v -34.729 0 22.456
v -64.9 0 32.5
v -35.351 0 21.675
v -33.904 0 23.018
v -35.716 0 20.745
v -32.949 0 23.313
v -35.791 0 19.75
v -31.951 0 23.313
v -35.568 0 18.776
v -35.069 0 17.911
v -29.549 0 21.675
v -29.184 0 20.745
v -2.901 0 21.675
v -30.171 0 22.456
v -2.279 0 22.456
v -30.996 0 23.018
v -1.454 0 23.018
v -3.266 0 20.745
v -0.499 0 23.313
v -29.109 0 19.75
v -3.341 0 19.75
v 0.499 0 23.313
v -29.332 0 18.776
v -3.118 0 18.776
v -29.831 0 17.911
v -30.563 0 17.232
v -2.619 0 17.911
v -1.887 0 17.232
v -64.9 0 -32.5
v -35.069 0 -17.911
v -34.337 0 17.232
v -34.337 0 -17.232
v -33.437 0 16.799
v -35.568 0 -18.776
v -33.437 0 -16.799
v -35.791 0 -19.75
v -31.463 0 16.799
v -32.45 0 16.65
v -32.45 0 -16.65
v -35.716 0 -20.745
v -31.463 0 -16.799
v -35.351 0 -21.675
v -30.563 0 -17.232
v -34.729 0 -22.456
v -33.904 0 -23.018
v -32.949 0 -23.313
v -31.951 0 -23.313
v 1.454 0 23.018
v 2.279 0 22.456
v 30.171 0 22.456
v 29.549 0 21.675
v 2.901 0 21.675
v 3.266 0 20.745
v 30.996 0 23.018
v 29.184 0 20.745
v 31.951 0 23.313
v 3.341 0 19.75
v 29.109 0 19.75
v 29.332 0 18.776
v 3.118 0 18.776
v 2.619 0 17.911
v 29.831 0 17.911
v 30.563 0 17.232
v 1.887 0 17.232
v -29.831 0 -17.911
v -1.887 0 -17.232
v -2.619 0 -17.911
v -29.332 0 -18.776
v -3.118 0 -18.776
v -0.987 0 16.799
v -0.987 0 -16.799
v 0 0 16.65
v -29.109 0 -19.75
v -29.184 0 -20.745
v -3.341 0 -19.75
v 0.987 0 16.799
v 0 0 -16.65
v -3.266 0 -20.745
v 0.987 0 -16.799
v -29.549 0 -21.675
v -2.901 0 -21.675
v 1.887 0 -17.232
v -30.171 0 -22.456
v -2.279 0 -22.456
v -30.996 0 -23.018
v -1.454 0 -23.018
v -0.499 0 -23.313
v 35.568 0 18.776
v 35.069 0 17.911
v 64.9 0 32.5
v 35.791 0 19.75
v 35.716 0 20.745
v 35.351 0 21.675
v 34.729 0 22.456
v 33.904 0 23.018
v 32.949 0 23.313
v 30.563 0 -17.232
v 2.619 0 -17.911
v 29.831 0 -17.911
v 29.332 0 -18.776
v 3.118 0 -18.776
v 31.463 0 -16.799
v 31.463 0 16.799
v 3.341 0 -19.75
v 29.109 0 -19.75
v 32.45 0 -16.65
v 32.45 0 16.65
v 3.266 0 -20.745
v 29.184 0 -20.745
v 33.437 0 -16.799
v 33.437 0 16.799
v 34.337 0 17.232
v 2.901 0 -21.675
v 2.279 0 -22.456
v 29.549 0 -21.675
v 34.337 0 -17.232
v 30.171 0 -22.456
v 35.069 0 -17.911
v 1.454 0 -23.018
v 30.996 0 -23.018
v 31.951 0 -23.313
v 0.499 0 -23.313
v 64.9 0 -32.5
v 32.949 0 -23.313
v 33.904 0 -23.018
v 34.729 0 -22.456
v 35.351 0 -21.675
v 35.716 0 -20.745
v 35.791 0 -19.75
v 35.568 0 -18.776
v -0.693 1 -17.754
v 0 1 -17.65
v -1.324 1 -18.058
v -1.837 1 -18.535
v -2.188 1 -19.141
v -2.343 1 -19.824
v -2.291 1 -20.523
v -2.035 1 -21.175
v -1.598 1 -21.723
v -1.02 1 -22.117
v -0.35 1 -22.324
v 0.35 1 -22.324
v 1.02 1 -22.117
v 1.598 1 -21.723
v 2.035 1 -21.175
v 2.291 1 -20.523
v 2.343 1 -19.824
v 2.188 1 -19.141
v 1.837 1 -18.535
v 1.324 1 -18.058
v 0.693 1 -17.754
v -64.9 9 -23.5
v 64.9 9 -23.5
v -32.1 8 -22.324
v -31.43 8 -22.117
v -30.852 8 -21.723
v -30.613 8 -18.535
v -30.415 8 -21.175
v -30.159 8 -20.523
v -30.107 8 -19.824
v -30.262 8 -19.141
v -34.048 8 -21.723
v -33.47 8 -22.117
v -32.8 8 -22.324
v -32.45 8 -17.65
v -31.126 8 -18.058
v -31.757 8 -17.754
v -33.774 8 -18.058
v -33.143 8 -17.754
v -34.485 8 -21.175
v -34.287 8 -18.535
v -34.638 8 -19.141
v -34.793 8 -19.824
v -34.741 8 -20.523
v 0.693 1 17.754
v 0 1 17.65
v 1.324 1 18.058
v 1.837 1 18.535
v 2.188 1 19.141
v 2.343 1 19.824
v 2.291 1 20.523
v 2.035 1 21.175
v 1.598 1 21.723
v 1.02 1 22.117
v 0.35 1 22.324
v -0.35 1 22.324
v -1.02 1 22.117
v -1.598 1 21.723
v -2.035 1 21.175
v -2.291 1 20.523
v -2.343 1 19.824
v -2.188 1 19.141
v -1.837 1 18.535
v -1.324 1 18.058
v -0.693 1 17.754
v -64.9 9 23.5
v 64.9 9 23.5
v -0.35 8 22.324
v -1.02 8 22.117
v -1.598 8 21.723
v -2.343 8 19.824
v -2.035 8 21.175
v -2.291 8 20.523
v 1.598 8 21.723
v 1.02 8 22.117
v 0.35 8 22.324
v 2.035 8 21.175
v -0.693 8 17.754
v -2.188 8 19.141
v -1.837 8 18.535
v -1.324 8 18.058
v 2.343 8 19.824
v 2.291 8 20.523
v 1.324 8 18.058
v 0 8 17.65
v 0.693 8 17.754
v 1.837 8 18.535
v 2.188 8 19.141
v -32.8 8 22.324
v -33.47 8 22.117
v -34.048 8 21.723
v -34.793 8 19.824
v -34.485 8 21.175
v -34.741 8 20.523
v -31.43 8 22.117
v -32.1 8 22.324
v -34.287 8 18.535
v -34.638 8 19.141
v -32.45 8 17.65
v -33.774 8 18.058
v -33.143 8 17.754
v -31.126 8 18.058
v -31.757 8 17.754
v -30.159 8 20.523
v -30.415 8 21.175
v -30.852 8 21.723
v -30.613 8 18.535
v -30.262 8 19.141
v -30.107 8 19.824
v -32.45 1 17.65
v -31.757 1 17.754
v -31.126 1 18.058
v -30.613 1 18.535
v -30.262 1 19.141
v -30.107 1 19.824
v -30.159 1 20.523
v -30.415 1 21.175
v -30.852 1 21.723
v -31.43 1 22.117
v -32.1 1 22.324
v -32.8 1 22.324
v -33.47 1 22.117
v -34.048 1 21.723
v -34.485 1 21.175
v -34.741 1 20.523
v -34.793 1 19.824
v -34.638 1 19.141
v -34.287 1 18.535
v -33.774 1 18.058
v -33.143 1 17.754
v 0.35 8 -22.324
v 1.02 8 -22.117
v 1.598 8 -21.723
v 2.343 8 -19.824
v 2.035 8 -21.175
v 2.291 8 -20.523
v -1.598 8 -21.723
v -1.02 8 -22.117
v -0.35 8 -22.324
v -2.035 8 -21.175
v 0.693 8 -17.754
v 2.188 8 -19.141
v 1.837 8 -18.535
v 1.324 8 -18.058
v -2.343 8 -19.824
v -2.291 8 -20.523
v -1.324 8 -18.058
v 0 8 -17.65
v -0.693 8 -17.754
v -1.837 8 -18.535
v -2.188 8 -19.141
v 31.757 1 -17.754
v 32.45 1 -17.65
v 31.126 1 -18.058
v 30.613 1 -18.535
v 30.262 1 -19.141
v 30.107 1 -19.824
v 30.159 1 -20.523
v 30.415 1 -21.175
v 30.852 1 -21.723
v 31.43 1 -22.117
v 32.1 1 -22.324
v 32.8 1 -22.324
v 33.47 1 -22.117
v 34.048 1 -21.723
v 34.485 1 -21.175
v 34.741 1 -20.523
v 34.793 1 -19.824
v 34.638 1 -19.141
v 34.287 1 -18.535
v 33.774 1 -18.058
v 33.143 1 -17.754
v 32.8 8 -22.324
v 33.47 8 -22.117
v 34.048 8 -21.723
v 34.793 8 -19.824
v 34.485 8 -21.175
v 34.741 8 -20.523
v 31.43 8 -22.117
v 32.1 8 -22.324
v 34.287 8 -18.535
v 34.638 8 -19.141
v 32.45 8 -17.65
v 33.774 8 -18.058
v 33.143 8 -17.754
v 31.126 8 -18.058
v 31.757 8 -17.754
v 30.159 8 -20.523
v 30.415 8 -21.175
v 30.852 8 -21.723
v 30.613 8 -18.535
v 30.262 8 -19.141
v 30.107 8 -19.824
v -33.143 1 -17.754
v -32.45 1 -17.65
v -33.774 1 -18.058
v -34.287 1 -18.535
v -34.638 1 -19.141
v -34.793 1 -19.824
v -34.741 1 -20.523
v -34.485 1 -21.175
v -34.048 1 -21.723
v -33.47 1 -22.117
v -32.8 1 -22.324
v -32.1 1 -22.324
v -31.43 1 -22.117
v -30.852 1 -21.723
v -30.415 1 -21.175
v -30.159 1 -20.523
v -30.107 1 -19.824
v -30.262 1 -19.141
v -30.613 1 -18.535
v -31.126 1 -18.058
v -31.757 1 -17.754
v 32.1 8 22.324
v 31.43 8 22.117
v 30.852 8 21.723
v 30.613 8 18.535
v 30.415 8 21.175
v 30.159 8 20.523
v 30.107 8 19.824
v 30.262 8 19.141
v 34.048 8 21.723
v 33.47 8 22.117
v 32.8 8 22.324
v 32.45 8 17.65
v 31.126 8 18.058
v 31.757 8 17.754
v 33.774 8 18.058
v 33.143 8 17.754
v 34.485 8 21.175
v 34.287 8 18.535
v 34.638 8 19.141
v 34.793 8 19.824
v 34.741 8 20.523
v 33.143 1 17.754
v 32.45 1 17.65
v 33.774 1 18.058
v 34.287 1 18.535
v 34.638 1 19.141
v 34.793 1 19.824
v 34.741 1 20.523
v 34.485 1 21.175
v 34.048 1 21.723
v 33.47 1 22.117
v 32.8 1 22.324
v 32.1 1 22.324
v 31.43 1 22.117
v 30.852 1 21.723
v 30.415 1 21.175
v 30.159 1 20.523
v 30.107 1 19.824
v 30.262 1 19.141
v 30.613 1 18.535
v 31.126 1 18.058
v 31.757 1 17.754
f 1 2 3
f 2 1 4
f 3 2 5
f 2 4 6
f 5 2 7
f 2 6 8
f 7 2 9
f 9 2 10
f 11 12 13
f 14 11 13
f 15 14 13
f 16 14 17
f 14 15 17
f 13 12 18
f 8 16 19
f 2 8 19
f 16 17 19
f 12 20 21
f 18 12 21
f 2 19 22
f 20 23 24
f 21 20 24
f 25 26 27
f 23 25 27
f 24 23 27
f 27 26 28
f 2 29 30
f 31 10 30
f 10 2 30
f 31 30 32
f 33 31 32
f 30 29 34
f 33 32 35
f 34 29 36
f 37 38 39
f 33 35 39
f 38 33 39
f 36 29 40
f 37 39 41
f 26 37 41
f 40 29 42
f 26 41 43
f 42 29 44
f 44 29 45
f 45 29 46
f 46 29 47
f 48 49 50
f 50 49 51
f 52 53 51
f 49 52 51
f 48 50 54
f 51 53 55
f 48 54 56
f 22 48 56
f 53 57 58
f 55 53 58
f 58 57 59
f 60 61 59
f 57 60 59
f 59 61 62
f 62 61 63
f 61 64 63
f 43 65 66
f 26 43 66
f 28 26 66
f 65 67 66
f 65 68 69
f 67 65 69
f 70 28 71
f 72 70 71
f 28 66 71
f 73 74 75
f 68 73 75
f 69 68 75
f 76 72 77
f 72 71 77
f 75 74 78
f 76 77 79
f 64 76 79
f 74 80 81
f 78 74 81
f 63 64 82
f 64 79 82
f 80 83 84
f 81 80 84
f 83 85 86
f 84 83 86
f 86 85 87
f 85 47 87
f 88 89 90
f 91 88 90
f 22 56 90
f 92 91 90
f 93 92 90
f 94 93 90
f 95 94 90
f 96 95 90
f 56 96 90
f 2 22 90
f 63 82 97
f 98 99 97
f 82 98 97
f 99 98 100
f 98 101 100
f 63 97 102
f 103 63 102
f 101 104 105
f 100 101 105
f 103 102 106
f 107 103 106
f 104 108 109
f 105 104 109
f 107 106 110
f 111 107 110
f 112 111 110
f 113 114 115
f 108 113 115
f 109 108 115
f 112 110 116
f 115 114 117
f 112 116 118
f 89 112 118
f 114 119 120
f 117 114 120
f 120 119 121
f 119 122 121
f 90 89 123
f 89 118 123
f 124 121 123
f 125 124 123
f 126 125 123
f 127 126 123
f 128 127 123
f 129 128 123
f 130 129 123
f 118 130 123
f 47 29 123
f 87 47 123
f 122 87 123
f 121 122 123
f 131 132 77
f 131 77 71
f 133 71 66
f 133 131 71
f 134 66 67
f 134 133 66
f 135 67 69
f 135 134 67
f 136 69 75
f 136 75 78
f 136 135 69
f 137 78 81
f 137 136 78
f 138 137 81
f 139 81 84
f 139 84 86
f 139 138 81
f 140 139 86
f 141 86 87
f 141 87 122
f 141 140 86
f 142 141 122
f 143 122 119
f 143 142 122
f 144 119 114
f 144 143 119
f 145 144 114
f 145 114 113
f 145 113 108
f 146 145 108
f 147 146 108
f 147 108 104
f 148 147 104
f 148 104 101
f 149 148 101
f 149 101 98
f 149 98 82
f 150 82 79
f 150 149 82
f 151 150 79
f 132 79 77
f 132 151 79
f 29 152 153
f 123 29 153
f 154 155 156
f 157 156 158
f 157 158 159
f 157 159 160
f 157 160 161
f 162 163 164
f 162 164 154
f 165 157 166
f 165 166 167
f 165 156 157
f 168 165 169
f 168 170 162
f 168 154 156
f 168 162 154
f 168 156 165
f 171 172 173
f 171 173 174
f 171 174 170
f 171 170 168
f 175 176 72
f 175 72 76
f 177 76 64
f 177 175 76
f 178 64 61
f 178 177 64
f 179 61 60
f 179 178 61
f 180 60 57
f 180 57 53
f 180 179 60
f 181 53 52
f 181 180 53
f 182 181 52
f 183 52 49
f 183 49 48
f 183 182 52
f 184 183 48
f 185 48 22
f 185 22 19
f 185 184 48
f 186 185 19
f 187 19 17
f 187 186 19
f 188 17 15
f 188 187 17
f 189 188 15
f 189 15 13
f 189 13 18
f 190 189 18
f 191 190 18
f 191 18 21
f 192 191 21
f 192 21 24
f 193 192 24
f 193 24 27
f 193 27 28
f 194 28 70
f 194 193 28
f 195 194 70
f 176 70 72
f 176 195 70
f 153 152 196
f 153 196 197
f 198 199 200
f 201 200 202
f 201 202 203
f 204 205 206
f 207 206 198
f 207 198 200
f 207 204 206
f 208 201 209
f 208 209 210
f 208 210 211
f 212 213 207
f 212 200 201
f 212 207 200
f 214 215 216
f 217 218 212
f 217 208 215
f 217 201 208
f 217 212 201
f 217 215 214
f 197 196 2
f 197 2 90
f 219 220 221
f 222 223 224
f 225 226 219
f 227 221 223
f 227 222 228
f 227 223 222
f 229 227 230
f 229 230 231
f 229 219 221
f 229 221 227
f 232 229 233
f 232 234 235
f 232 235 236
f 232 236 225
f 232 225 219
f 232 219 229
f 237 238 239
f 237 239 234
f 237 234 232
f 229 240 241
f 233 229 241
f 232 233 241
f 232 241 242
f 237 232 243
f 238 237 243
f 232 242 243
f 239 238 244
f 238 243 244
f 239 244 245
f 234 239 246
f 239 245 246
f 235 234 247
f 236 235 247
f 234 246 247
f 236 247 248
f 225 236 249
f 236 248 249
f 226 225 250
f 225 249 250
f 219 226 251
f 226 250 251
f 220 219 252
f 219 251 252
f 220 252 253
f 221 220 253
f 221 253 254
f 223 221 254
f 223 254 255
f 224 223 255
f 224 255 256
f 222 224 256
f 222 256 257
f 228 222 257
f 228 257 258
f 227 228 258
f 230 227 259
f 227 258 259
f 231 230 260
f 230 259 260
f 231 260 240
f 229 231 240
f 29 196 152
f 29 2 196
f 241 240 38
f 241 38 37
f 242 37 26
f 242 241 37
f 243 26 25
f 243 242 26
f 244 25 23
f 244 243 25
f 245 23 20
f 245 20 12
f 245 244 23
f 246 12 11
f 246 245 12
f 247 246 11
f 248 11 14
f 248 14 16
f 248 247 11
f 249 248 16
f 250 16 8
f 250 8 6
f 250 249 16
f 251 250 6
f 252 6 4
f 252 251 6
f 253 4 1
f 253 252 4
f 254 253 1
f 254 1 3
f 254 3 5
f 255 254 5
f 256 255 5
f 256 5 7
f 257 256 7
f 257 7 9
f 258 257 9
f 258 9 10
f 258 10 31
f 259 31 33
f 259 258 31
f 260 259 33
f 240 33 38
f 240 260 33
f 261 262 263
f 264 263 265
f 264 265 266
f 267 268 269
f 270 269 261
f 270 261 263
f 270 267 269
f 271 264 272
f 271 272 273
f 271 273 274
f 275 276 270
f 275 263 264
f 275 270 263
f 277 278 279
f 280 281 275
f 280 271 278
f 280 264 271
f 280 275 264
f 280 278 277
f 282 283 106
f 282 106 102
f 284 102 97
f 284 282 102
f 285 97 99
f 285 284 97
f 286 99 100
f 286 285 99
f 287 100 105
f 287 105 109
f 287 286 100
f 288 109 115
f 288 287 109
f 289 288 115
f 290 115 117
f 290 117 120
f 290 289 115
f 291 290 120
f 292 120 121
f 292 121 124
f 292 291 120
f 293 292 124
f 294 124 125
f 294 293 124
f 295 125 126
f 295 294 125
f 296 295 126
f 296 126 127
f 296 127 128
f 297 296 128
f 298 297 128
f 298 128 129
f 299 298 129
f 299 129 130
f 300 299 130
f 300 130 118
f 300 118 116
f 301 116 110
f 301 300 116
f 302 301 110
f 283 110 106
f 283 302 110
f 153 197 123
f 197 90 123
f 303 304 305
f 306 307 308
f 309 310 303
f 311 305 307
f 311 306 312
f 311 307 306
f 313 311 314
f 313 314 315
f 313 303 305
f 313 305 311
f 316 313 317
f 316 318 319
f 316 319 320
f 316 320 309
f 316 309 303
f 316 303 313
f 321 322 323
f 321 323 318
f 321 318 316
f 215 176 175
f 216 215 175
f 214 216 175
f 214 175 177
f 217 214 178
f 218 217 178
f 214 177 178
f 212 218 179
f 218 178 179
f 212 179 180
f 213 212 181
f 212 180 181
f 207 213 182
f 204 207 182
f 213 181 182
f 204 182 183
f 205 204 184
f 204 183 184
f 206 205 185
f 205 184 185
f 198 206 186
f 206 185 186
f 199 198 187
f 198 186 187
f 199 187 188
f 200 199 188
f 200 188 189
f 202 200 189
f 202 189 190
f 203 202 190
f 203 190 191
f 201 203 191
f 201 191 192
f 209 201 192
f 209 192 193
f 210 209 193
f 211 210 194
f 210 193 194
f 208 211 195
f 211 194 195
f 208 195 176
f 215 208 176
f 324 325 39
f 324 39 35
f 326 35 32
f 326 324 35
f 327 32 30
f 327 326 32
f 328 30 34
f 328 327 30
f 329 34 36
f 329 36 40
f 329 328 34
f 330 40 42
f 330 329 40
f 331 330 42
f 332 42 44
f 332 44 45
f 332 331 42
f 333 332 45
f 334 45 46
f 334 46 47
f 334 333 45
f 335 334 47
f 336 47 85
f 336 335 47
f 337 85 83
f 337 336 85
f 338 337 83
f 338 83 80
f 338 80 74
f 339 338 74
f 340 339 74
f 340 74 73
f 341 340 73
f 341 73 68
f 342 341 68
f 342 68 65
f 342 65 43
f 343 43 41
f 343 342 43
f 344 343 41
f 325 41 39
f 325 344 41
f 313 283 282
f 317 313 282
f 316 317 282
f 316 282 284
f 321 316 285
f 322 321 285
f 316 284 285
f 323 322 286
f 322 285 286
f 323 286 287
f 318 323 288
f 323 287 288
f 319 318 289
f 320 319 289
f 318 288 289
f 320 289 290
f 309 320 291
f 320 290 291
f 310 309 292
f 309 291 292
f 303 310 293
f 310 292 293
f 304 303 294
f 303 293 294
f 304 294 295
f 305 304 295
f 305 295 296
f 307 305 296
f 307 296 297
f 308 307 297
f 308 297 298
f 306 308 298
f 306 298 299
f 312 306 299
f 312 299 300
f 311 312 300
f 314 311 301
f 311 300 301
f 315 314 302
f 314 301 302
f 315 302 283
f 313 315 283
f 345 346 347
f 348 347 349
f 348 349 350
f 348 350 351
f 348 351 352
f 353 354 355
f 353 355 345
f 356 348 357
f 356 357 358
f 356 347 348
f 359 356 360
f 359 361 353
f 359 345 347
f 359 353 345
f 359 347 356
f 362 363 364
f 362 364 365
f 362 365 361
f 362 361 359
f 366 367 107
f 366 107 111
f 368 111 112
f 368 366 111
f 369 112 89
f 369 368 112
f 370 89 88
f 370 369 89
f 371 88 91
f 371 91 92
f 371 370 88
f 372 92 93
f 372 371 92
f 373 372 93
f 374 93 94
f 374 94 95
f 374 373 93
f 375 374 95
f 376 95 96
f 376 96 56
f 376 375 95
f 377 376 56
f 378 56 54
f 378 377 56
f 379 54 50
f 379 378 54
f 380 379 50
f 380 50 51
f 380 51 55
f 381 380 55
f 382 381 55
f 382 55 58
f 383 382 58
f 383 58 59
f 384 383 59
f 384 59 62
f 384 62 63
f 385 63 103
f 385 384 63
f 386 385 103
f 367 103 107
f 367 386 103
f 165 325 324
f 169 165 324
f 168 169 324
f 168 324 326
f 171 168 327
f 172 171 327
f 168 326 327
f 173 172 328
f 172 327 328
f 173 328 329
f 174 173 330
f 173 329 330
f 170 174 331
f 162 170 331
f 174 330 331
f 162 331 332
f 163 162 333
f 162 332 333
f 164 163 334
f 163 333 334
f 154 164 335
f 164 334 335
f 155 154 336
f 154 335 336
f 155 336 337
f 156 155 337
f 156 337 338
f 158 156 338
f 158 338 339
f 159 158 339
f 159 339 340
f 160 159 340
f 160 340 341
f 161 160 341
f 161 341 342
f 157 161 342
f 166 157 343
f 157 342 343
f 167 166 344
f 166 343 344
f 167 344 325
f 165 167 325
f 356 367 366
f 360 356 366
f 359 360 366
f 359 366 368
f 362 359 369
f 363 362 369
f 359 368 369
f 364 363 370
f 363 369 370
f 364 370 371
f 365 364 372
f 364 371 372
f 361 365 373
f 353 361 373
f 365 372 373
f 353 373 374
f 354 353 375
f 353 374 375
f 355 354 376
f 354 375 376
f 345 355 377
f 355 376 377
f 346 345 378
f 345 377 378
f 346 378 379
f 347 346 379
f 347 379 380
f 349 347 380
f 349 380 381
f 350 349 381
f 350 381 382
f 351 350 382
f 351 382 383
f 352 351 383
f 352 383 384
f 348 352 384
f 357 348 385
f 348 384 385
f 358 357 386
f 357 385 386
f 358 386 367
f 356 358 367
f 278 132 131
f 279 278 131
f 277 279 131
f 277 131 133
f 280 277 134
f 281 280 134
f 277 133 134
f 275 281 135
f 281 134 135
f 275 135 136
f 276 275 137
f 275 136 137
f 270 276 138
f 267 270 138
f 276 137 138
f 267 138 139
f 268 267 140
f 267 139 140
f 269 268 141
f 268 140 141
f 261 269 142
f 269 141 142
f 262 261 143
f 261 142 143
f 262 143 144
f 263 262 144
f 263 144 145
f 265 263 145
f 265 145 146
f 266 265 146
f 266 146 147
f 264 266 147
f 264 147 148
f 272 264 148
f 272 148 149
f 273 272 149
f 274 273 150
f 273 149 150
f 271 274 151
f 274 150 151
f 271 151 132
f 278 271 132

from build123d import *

# Parameters (mm, degrees)
SKETCH1_W           = 129.8
SKETCH1_H           = 65
BOSS_EXTRUDE1_DEPTH = 9
SKETCH2_R           = 2.35
CUT_EXTRUDE1_DEPTH  = 8
CHAMFER1_SIZE       = 1
CHAMFER2_SIZE       = 9


with BuildPart() as part:
    # Sketch1 → Boss-Extrude1 (new body)
    with BuildSketch(Plane(origin=(0, 0, 0), x_dir=(1, 0, 0), z_dir=(0, 1, 0))):
        Rectangle(SKETCH1_W, SKETCH1_H)
    extrude(amount=BOSS_EXTRUDE1_DEPTH)

    # Sketch2 → Cut-Extrude1 (cut)
    with BuildSketch(Plane.XZ):
        with Locations(Location((-32.45, 20, 0), (0, 0, 270))):
            Circle(SKETCH2_R)
        with Locations(Location((0, 20, 0), (0, 0, 270))):
            Circle(SKETCH2_R)
        with Locations(Location((32.45, 20, 0), (0, 0, 270))):
            Circle(SKETCH2_R)
        with Locations(Location((32.45, -20, 0), (0, 0, 90))):
            Circle(SKETCH2_R)
        with Locations(Location((0, -20, 0), (0, 0, 90))):
            Circle(SKETCH2_R)
        with Locations(Location((-32.45, -20, 0), (0, 0, 90))):
            Circle(SKETCH2_R)
    extrude(amount=-CUT_EXTRUDE1_DEPTH, mode=Mode.SUBTRACT)

    # Chamfer1
    chamfer1_edges = [part.edges().sort_by_distance(p)[0] for p in [
        (-32.45, 0, -22.35),
        (0, 0, -22.35),
        (32.45, 0, -22.35),
        (32.45, 0, 22.35),
        (0, 0, 22.35),
        (-32.45, 0, 22.35),
    ]]
    chamfer(chamfer1_edges, length=CHAMFER1_SIZE)

    # Chamfer2
    chamfer2_edges = [part.edges().sort_by_distance(p)[0] for p in [
        (0, 9, 32.5),
        (0, 9, -32.5),
    ]]
    chamfer(chamfer2_edges, length=CHAMFER2_SIZE - 0.0001)  # a hair under: the kernel refuses the full size


solid = part.part
